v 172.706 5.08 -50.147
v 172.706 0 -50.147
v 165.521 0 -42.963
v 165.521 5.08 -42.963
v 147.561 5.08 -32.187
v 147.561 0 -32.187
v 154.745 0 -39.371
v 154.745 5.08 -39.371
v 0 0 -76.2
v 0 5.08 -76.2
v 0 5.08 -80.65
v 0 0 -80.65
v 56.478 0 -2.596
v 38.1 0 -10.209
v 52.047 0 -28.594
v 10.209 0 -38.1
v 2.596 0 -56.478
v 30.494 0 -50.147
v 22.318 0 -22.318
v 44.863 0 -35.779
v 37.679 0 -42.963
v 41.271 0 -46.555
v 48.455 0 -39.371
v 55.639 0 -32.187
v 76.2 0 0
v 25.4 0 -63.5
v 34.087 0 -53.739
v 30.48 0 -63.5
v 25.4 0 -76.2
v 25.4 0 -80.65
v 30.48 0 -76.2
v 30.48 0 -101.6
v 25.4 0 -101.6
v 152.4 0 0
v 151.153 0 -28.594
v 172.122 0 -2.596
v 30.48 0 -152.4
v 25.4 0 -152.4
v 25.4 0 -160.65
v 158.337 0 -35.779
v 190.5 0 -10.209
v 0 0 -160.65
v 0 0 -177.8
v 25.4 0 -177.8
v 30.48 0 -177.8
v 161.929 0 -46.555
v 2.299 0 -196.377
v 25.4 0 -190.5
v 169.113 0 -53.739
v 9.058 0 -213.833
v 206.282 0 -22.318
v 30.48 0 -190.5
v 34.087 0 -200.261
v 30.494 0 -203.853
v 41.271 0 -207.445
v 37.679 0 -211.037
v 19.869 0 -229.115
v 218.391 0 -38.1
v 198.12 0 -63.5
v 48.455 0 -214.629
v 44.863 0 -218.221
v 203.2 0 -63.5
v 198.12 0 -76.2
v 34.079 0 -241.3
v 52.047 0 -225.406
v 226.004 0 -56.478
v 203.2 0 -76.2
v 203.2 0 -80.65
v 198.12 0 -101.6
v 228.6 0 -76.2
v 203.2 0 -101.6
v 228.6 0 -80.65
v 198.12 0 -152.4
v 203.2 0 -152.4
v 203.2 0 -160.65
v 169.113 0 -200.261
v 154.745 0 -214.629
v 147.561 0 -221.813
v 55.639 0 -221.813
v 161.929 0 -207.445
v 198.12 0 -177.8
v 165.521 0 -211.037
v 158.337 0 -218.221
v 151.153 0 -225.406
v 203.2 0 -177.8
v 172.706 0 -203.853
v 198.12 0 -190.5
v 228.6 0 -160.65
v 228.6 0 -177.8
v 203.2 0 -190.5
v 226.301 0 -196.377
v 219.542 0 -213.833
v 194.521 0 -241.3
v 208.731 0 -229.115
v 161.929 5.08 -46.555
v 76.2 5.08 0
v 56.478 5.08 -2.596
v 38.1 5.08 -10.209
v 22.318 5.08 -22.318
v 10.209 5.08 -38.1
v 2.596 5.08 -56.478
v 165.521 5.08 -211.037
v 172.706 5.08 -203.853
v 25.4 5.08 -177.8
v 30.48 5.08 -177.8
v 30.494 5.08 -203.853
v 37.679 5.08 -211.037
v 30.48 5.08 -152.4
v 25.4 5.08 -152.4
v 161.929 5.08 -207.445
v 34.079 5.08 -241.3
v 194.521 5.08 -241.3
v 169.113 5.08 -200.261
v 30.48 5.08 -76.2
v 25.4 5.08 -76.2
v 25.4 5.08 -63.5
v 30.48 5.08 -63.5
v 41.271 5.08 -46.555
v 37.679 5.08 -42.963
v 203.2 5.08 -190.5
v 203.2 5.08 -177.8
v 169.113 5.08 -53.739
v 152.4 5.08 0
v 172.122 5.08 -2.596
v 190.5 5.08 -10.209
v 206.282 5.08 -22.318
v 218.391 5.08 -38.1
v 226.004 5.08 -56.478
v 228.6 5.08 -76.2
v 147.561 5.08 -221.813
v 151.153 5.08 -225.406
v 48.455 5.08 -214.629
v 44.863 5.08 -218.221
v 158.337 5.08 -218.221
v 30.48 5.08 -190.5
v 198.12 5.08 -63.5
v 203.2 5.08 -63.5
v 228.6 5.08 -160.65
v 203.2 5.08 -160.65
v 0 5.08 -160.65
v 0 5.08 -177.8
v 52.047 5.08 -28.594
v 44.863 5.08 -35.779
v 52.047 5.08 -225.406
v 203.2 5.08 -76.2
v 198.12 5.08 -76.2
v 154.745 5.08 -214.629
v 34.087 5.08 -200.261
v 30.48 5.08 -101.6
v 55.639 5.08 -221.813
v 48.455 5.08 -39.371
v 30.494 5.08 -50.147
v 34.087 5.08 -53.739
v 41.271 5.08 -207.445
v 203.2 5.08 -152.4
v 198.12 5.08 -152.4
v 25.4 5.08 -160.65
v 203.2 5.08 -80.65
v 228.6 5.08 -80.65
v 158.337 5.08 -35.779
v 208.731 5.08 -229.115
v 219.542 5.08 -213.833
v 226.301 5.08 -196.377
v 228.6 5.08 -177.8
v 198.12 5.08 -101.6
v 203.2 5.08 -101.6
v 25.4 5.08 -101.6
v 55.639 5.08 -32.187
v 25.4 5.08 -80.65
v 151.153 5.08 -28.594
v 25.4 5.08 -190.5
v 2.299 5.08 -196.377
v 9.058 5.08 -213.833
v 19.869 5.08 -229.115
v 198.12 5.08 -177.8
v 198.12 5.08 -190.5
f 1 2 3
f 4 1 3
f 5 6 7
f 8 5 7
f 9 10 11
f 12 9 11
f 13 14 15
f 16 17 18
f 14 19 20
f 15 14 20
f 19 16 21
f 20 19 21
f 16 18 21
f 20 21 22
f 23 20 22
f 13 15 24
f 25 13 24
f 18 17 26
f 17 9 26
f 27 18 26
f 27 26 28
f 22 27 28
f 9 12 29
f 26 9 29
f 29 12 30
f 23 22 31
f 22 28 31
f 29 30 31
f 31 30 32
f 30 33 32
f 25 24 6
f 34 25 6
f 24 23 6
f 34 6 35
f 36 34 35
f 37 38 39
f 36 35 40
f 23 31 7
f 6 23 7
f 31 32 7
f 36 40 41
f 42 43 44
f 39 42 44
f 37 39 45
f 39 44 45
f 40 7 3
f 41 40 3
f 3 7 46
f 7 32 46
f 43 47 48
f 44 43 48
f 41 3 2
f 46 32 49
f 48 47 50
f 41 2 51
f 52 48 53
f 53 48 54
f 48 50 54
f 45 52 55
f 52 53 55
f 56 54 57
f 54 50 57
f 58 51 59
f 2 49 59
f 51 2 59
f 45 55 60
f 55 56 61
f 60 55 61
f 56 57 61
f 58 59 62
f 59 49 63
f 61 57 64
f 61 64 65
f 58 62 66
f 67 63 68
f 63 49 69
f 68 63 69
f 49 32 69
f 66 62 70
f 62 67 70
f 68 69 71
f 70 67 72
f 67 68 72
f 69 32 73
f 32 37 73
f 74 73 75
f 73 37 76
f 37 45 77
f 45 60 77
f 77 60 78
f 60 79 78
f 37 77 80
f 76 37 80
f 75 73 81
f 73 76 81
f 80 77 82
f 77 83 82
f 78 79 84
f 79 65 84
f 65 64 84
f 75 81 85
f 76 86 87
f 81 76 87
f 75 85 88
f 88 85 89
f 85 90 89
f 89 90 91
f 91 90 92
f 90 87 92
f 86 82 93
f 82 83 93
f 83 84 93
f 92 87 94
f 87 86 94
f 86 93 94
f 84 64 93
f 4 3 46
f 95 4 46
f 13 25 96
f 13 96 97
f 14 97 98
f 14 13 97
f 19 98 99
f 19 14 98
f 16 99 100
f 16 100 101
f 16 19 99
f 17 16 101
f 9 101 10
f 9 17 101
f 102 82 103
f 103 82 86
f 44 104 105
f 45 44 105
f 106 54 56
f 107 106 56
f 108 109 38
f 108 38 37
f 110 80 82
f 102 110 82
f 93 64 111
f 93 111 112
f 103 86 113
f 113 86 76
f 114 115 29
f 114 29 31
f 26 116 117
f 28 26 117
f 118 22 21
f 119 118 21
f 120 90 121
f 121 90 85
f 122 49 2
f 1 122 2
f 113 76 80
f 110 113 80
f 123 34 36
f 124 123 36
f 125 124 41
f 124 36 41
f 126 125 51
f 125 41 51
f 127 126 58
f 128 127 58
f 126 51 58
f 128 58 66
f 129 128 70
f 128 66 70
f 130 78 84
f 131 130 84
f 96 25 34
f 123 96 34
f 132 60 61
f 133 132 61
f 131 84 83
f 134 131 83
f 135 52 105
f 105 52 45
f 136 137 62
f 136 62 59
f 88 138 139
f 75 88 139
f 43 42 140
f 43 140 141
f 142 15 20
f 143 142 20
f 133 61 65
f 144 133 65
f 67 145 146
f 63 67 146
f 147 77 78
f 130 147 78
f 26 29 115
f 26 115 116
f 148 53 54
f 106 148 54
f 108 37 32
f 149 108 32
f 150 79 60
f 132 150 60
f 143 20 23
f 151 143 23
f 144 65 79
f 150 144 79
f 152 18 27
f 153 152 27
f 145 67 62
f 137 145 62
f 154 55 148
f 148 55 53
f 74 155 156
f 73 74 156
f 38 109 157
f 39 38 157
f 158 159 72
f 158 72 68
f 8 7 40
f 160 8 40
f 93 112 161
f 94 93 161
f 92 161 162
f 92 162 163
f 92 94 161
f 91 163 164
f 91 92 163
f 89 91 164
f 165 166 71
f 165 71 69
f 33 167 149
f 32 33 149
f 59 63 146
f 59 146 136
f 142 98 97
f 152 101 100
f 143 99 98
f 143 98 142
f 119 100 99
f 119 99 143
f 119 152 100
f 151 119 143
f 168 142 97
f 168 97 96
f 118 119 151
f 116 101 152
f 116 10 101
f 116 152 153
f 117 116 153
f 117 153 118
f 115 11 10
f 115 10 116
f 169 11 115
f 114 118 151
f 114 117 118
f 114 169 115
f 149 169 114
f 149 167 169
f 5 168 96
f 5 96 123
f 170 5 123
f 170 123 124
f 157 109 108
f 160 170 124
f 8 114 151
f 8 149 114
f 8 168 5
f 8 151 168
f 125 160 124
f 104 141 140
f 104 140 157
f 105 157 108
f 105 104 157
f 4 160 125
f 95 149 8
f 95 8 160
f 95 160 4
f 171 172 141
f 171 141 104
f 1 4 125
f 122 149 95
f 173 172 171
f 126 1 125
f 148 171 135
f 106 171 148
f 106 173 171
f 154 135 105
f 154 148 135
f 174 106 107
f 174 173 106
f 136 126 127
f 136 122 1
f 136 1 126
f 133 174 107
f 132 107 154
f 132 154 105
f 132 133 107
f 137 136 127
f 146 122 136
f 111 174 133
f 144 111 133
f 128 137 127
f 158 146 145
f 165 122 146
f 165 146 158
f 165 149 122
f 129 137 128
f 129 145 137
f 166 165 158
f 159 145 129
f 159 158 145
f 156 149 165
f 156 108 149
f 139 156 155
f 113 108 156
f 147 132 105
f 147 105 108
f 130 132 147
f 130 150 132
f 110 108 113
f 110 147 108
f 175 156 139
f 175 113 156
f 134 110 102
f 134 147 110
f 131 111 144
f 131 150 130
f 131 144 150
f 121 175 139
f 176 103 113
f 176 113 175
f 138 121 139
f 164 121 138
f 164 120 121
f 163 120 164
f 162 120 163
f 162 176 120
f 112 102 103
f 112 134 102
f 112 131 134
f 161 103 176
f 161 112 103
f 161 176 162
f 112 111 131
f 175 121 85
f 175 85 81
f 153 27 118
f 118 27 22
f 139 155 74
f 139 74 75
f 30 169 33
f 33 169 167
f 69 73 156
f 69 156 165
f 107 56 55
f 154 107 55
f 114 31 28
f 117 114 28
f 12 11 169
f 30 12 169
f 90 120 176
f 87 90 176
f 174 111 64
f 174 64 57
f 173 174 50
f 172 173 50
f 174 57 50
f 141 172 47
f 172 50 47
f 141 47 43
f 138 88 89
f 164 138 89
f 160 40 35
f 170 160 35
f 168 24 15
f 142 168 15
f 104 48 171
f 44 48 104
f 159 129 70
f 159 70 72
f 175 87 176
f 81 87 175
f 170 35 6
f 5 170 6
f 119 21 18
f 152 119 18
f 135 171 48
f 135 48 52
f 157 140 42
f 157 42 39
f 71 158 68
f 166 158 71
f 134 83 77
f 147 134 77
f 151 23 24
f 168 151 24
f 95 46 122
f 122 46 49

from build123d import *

# Parameters (mm, degrees)
SKETCH1_W            = 228.6
SKETCH1_H            = 241.3
BOSS_EXTRUDE1_DEPTH  = 5.08
SKETCH2_W            = 25.4
SKETCH2_H            = 80
CUT_EXTRUDE1_DEPTH   = 5.08
SKETCH3_W            = 5.08
SKETCH3_H            = 12.7
SKETCH3_H_2          = 50.8
CUT_EXTRUDE2_DEPTH   = 5.08
CUT_EXTRUDE3_REACH   = 7.08
CUT_EXTRUDE4_DEPTH   = 5.08
MIRROR4_COPY_1_DEPTH = 5.08


with BuildPart() as part:
    # Sketch1 → Boss-Extrude1 (new body)
    with BuildSketch(Plane(origin=(0, 0, 0), x_dir=(1, 0, 0), z_dir=(0, 1, 0))):
        with Locations((114.3, 120.65)):
            Rectangle(SKETCH1_W, SKETCH1_H)
    extrude(amount=BOSS_EXTRUDE1_DEPTH)

    # Sketch2 → Cut-Extrude1 (cut)
    with BuildSketch(Plane(origin=(0, 5.08, 0), x_dir=(1, 0, 0), z_dir=(0, 1, 0))):
        with Locations((12.7, 120.65)):
            Rectangle(SKETCH2_W, SKETCH2_H)
    cut_extrude1 = extrude(amount=-CUT_EXTRUDE1_DEPTH, mode=Mode.SUBTRACT)

    # Mirror1: Cut-Extrude1 across plane
    add(cut_extrude1.mirror(Plane.ZY.offset(-114.3)), mode=Mode.SUBTRACT)

    # Sketch3 → Cut-Extrude2 (cut)
    with BuildSketch(Plane.XZ):
        with Locations((27.94, -184.15)):
            Rectangle(SKETCH3_W, SKETCH3_H)
        with Locations((27.94, -127)):
            Rectangle(SKETCH3_W, SKETCH3_H_2)
        with Locations((27.94, -69.85)):
            Rectangle(SKETCH3_W, SKETCH3_H)
    cut_extrude2 = extrude(amount=-CUT_EXTRUDE2_DEPTH, mode=Mode.SUBTRACT)

    # Mirror2: Cut-Extrude2 across plane
    add(cut_extrude2.mirror(Plane.ZY.offset(-114.3)), mode=Mode.SUBTRACT)

    # Sketch4 → Cut-Extrude3 (cut, up to next)
    with BuildSketch(Plane.XZ, mode=Mode.PRIVATE) as cut_extrude3_sk1:
        Polygon((55.639202938, -221.813411753), (48.454998041, -214.629206856), (44.862895593, -218.221309304), (52.047100489, -225.405514201), align=None)
    cut_extrude3_tool1 = extrude(cut_extrude3_sk1.sketch, amount=-CUT_EXTRUDE3_REACH, mode=Mode.PRIVATE) & part.part
    add(cut_extrude3_tool1.solids().sort_by_distance((50.251049, 0, -220.017361))[0], mode=Mode.SUBTRACT)
    # Sketch4 → Cut-Extrude3 (cut, up to next)
    with BuildSketch(Plane.XZ, mode=Mode.PRIVATE) as cut_extrude3_sk2:
        Polygon((41.270793144, -207.445001959), (34.086588247, -200.260797062), (30.494485799, -203.852899511), (37.678690696, -211.037104407), align=None)
    cut_extrude3_tool2 = extrude(cut_extrude3_sk2.sketch, amount=-CUT_EXTRUDE3_REACH, mode=Mode.PRIVATE) & part.part
    add(cut_extrude3_tool2.solids().sort_by_distance((35.882639, 0, -205.648951))[0], mode=Mode.SUBTRACT)
    # Sketch4 → Cut-Extrude3 (cut, up to next)
    with BuildSketch(Plane.XZ, mode=Mode.PRIVATE) as cut_extrude3_sk3:
        Polygon((34.086588247, -53.739202938), (41.270793144, -46.554998041), (37.678690696, -42.962895593), (30.494485799, -50.147100489), align=None)
    cut_extrude3_tool3 = extrude(cut_extrude3_sk3.sketch, amount=-CUT_EXTRUDE3_REACH, mode=Mode.PRIVATE) & part.part
    add(cut_extrude3_tool3.solids().sort_by_distance((35.882639, 0, -48.351049))[0], mode=Mode.SUBTRACT)
    # Sketch4 → Cut-Extrude3 (cut, up to next)
    with BuildSketch(Plane.XZ, mode=Mode.PRIVATE) as cut_extrude3_sk4:
        Polygon((48.454998041, -39.370793144), (55.639202938, -32.186588247), (52.047100489, -28.594485799), (44.862895593, -35.778690696), align=None)
    cut_extrude3_tool4 = extrude(cut_extrude3_sk4.sketch, amount=-CUT_EXTRUDE3_REACH, mode=Mode.PRIVATE) & part.part
    add(cut_extrude3_tool4.solids().sort_by_distance((50.251049, 0, -33.982639))[0], mode=Mode.SUBTRACT)
    # Sketch4 → Cut-Extrude3 (cut, up to next)
    with BuildSketch(Plane.XZ, mode=Mode.PRIVATE) as cut_extrude3_sk5:
        Polygon((147.560797062, -32.186588247), (154.745001959, -39.370793144), (158.337104407, -35.778690696), (151.152899511, -28.594485799), align=None)
    cut_extrude3_tool5 = extrude(cut_extrude3_sk5.sketch, amount=-CUT_EXTRUDE3_REACH, mode=Mode.PRIVATE) & part.part
    add(cut_extrude3_tool5.solids().sort_by_distance((152.948951, 0, -33.982639))[0], mode=Mode.SUBTRACT)
    # Sketch4 → Cut-Extrude3 (cut, up to next)
    with BuildSketch(Plane.XZ, mode=Mode.PRIVATE) as cut_extrude3_sk6:
        Polygon((161.929206856, -46.554998041), (169.113411753, -53.739202938), (172.705514201, -50.147100489), (165.521309304, -42.962895593), align=None)
    cut_extrude3_tool6 = extrude(cut_extrude3_sk6.sketch, amount=-CUT_EXTRUDE3_REACH, mode=Mode.PRIVATE) & part.part
    add(cut_extrude3_tool6.solids().sort_by_distance((167.317361, 0, -48.351049))[0], mode=Mode.SUBTRACT)
    # Sketch4 → Cut-Extrude3 (cut, up to next)
    with BuildSketch(Plane.XZ, mode=Mode.PRIVATE) as cut_extrude3_sk7:
        Polygon((154.745001959, -214.629206856), (147.560797062, -221.813411753), (151.152899511, -225.405514201), (158.337104407, -218.221309304), align=None)
    cut_extrude3_tool7 = extrude(cut_extrude3_sk7.sketch, amount=-CUT_EXTRUDE3_REACH, mode=Mode.PRIVATE) & part.part
    add(cut_extrude3_tool7.solids().sort_by_distance((152.948951, 0, -220.017361))[0], mode=Mode.SUBTRACT)
    # Sketch4 → Cut-Extrude3 (cut, up to next)
    with BuildSketch(Plane.XZ, mode=Mode.PRIVATE) as cut_extrude3_sk8:
        Polygon((169.113411753, -200.260797062), (161.929206856, -207.445001959), (165.521309304, -211.037104407), (172.705514201, -203.852899511), align=None)
    cut_extrude3_tool8 = extrude(cut_extrude3_sk8.sketch, amount=-CUT_EXTRUDE3_REACH, mode=Mode.PRIVATE) & part.part
    add(cut_extrude3_tool8.solids().sort_by_distance((167.317361, 0, -205.648951))[0], mode=Mode.SUBTRACT)

    # Sketch5 → Cut-Extrude4 (cut)
    with BuildSketch(Plane.XZ):
        with BuildLine():
            Line((0, -76.2), (0, 0))
            Line((0, 0), (76.2, 0))
            ThreePointArc((76.2, 0), (22.318463274, -22.318463274), (0, -76.2))
        make_face()
    cut_extrude4 = extrude(amount=-CUT_EXTRUDE4_DEPTH, mode=Mode.SUBTRACT)

    # Mirror3: Cut-Extrude4 across plane
    add(cut_extrude4.mirror(Plane.ZY.offset(-114.3)), mode=Mode.SUBTRACT)

    # Mirror4: Cut-Extrude4 across plane
    add(cut_extrude4.mirror(Plane.XY.offset(-127)), mode=Mode.SUBTRACT)

    # Mirror4 copy 1 sketch → Mirror4 copy 1 (cut)
    with BuildSketch(Plane(origin=(228.6, 0, -254), x_dir=(-1, 0, 0), z_dir=(0, -1, 0))):
        with BuildLine():
            Line((0, -76.2), (0, 0))
            Line((0, 0), (76.2, 0))
            ThreePointArc((76.2, 0), (22.318463274, -22.318463274), (0, -76.2))
        make_face()
    extrude(amount=-MIRROR4_COPY_1_DEPTH, mode=Mode.SUBTRACT)


solid = part.part
